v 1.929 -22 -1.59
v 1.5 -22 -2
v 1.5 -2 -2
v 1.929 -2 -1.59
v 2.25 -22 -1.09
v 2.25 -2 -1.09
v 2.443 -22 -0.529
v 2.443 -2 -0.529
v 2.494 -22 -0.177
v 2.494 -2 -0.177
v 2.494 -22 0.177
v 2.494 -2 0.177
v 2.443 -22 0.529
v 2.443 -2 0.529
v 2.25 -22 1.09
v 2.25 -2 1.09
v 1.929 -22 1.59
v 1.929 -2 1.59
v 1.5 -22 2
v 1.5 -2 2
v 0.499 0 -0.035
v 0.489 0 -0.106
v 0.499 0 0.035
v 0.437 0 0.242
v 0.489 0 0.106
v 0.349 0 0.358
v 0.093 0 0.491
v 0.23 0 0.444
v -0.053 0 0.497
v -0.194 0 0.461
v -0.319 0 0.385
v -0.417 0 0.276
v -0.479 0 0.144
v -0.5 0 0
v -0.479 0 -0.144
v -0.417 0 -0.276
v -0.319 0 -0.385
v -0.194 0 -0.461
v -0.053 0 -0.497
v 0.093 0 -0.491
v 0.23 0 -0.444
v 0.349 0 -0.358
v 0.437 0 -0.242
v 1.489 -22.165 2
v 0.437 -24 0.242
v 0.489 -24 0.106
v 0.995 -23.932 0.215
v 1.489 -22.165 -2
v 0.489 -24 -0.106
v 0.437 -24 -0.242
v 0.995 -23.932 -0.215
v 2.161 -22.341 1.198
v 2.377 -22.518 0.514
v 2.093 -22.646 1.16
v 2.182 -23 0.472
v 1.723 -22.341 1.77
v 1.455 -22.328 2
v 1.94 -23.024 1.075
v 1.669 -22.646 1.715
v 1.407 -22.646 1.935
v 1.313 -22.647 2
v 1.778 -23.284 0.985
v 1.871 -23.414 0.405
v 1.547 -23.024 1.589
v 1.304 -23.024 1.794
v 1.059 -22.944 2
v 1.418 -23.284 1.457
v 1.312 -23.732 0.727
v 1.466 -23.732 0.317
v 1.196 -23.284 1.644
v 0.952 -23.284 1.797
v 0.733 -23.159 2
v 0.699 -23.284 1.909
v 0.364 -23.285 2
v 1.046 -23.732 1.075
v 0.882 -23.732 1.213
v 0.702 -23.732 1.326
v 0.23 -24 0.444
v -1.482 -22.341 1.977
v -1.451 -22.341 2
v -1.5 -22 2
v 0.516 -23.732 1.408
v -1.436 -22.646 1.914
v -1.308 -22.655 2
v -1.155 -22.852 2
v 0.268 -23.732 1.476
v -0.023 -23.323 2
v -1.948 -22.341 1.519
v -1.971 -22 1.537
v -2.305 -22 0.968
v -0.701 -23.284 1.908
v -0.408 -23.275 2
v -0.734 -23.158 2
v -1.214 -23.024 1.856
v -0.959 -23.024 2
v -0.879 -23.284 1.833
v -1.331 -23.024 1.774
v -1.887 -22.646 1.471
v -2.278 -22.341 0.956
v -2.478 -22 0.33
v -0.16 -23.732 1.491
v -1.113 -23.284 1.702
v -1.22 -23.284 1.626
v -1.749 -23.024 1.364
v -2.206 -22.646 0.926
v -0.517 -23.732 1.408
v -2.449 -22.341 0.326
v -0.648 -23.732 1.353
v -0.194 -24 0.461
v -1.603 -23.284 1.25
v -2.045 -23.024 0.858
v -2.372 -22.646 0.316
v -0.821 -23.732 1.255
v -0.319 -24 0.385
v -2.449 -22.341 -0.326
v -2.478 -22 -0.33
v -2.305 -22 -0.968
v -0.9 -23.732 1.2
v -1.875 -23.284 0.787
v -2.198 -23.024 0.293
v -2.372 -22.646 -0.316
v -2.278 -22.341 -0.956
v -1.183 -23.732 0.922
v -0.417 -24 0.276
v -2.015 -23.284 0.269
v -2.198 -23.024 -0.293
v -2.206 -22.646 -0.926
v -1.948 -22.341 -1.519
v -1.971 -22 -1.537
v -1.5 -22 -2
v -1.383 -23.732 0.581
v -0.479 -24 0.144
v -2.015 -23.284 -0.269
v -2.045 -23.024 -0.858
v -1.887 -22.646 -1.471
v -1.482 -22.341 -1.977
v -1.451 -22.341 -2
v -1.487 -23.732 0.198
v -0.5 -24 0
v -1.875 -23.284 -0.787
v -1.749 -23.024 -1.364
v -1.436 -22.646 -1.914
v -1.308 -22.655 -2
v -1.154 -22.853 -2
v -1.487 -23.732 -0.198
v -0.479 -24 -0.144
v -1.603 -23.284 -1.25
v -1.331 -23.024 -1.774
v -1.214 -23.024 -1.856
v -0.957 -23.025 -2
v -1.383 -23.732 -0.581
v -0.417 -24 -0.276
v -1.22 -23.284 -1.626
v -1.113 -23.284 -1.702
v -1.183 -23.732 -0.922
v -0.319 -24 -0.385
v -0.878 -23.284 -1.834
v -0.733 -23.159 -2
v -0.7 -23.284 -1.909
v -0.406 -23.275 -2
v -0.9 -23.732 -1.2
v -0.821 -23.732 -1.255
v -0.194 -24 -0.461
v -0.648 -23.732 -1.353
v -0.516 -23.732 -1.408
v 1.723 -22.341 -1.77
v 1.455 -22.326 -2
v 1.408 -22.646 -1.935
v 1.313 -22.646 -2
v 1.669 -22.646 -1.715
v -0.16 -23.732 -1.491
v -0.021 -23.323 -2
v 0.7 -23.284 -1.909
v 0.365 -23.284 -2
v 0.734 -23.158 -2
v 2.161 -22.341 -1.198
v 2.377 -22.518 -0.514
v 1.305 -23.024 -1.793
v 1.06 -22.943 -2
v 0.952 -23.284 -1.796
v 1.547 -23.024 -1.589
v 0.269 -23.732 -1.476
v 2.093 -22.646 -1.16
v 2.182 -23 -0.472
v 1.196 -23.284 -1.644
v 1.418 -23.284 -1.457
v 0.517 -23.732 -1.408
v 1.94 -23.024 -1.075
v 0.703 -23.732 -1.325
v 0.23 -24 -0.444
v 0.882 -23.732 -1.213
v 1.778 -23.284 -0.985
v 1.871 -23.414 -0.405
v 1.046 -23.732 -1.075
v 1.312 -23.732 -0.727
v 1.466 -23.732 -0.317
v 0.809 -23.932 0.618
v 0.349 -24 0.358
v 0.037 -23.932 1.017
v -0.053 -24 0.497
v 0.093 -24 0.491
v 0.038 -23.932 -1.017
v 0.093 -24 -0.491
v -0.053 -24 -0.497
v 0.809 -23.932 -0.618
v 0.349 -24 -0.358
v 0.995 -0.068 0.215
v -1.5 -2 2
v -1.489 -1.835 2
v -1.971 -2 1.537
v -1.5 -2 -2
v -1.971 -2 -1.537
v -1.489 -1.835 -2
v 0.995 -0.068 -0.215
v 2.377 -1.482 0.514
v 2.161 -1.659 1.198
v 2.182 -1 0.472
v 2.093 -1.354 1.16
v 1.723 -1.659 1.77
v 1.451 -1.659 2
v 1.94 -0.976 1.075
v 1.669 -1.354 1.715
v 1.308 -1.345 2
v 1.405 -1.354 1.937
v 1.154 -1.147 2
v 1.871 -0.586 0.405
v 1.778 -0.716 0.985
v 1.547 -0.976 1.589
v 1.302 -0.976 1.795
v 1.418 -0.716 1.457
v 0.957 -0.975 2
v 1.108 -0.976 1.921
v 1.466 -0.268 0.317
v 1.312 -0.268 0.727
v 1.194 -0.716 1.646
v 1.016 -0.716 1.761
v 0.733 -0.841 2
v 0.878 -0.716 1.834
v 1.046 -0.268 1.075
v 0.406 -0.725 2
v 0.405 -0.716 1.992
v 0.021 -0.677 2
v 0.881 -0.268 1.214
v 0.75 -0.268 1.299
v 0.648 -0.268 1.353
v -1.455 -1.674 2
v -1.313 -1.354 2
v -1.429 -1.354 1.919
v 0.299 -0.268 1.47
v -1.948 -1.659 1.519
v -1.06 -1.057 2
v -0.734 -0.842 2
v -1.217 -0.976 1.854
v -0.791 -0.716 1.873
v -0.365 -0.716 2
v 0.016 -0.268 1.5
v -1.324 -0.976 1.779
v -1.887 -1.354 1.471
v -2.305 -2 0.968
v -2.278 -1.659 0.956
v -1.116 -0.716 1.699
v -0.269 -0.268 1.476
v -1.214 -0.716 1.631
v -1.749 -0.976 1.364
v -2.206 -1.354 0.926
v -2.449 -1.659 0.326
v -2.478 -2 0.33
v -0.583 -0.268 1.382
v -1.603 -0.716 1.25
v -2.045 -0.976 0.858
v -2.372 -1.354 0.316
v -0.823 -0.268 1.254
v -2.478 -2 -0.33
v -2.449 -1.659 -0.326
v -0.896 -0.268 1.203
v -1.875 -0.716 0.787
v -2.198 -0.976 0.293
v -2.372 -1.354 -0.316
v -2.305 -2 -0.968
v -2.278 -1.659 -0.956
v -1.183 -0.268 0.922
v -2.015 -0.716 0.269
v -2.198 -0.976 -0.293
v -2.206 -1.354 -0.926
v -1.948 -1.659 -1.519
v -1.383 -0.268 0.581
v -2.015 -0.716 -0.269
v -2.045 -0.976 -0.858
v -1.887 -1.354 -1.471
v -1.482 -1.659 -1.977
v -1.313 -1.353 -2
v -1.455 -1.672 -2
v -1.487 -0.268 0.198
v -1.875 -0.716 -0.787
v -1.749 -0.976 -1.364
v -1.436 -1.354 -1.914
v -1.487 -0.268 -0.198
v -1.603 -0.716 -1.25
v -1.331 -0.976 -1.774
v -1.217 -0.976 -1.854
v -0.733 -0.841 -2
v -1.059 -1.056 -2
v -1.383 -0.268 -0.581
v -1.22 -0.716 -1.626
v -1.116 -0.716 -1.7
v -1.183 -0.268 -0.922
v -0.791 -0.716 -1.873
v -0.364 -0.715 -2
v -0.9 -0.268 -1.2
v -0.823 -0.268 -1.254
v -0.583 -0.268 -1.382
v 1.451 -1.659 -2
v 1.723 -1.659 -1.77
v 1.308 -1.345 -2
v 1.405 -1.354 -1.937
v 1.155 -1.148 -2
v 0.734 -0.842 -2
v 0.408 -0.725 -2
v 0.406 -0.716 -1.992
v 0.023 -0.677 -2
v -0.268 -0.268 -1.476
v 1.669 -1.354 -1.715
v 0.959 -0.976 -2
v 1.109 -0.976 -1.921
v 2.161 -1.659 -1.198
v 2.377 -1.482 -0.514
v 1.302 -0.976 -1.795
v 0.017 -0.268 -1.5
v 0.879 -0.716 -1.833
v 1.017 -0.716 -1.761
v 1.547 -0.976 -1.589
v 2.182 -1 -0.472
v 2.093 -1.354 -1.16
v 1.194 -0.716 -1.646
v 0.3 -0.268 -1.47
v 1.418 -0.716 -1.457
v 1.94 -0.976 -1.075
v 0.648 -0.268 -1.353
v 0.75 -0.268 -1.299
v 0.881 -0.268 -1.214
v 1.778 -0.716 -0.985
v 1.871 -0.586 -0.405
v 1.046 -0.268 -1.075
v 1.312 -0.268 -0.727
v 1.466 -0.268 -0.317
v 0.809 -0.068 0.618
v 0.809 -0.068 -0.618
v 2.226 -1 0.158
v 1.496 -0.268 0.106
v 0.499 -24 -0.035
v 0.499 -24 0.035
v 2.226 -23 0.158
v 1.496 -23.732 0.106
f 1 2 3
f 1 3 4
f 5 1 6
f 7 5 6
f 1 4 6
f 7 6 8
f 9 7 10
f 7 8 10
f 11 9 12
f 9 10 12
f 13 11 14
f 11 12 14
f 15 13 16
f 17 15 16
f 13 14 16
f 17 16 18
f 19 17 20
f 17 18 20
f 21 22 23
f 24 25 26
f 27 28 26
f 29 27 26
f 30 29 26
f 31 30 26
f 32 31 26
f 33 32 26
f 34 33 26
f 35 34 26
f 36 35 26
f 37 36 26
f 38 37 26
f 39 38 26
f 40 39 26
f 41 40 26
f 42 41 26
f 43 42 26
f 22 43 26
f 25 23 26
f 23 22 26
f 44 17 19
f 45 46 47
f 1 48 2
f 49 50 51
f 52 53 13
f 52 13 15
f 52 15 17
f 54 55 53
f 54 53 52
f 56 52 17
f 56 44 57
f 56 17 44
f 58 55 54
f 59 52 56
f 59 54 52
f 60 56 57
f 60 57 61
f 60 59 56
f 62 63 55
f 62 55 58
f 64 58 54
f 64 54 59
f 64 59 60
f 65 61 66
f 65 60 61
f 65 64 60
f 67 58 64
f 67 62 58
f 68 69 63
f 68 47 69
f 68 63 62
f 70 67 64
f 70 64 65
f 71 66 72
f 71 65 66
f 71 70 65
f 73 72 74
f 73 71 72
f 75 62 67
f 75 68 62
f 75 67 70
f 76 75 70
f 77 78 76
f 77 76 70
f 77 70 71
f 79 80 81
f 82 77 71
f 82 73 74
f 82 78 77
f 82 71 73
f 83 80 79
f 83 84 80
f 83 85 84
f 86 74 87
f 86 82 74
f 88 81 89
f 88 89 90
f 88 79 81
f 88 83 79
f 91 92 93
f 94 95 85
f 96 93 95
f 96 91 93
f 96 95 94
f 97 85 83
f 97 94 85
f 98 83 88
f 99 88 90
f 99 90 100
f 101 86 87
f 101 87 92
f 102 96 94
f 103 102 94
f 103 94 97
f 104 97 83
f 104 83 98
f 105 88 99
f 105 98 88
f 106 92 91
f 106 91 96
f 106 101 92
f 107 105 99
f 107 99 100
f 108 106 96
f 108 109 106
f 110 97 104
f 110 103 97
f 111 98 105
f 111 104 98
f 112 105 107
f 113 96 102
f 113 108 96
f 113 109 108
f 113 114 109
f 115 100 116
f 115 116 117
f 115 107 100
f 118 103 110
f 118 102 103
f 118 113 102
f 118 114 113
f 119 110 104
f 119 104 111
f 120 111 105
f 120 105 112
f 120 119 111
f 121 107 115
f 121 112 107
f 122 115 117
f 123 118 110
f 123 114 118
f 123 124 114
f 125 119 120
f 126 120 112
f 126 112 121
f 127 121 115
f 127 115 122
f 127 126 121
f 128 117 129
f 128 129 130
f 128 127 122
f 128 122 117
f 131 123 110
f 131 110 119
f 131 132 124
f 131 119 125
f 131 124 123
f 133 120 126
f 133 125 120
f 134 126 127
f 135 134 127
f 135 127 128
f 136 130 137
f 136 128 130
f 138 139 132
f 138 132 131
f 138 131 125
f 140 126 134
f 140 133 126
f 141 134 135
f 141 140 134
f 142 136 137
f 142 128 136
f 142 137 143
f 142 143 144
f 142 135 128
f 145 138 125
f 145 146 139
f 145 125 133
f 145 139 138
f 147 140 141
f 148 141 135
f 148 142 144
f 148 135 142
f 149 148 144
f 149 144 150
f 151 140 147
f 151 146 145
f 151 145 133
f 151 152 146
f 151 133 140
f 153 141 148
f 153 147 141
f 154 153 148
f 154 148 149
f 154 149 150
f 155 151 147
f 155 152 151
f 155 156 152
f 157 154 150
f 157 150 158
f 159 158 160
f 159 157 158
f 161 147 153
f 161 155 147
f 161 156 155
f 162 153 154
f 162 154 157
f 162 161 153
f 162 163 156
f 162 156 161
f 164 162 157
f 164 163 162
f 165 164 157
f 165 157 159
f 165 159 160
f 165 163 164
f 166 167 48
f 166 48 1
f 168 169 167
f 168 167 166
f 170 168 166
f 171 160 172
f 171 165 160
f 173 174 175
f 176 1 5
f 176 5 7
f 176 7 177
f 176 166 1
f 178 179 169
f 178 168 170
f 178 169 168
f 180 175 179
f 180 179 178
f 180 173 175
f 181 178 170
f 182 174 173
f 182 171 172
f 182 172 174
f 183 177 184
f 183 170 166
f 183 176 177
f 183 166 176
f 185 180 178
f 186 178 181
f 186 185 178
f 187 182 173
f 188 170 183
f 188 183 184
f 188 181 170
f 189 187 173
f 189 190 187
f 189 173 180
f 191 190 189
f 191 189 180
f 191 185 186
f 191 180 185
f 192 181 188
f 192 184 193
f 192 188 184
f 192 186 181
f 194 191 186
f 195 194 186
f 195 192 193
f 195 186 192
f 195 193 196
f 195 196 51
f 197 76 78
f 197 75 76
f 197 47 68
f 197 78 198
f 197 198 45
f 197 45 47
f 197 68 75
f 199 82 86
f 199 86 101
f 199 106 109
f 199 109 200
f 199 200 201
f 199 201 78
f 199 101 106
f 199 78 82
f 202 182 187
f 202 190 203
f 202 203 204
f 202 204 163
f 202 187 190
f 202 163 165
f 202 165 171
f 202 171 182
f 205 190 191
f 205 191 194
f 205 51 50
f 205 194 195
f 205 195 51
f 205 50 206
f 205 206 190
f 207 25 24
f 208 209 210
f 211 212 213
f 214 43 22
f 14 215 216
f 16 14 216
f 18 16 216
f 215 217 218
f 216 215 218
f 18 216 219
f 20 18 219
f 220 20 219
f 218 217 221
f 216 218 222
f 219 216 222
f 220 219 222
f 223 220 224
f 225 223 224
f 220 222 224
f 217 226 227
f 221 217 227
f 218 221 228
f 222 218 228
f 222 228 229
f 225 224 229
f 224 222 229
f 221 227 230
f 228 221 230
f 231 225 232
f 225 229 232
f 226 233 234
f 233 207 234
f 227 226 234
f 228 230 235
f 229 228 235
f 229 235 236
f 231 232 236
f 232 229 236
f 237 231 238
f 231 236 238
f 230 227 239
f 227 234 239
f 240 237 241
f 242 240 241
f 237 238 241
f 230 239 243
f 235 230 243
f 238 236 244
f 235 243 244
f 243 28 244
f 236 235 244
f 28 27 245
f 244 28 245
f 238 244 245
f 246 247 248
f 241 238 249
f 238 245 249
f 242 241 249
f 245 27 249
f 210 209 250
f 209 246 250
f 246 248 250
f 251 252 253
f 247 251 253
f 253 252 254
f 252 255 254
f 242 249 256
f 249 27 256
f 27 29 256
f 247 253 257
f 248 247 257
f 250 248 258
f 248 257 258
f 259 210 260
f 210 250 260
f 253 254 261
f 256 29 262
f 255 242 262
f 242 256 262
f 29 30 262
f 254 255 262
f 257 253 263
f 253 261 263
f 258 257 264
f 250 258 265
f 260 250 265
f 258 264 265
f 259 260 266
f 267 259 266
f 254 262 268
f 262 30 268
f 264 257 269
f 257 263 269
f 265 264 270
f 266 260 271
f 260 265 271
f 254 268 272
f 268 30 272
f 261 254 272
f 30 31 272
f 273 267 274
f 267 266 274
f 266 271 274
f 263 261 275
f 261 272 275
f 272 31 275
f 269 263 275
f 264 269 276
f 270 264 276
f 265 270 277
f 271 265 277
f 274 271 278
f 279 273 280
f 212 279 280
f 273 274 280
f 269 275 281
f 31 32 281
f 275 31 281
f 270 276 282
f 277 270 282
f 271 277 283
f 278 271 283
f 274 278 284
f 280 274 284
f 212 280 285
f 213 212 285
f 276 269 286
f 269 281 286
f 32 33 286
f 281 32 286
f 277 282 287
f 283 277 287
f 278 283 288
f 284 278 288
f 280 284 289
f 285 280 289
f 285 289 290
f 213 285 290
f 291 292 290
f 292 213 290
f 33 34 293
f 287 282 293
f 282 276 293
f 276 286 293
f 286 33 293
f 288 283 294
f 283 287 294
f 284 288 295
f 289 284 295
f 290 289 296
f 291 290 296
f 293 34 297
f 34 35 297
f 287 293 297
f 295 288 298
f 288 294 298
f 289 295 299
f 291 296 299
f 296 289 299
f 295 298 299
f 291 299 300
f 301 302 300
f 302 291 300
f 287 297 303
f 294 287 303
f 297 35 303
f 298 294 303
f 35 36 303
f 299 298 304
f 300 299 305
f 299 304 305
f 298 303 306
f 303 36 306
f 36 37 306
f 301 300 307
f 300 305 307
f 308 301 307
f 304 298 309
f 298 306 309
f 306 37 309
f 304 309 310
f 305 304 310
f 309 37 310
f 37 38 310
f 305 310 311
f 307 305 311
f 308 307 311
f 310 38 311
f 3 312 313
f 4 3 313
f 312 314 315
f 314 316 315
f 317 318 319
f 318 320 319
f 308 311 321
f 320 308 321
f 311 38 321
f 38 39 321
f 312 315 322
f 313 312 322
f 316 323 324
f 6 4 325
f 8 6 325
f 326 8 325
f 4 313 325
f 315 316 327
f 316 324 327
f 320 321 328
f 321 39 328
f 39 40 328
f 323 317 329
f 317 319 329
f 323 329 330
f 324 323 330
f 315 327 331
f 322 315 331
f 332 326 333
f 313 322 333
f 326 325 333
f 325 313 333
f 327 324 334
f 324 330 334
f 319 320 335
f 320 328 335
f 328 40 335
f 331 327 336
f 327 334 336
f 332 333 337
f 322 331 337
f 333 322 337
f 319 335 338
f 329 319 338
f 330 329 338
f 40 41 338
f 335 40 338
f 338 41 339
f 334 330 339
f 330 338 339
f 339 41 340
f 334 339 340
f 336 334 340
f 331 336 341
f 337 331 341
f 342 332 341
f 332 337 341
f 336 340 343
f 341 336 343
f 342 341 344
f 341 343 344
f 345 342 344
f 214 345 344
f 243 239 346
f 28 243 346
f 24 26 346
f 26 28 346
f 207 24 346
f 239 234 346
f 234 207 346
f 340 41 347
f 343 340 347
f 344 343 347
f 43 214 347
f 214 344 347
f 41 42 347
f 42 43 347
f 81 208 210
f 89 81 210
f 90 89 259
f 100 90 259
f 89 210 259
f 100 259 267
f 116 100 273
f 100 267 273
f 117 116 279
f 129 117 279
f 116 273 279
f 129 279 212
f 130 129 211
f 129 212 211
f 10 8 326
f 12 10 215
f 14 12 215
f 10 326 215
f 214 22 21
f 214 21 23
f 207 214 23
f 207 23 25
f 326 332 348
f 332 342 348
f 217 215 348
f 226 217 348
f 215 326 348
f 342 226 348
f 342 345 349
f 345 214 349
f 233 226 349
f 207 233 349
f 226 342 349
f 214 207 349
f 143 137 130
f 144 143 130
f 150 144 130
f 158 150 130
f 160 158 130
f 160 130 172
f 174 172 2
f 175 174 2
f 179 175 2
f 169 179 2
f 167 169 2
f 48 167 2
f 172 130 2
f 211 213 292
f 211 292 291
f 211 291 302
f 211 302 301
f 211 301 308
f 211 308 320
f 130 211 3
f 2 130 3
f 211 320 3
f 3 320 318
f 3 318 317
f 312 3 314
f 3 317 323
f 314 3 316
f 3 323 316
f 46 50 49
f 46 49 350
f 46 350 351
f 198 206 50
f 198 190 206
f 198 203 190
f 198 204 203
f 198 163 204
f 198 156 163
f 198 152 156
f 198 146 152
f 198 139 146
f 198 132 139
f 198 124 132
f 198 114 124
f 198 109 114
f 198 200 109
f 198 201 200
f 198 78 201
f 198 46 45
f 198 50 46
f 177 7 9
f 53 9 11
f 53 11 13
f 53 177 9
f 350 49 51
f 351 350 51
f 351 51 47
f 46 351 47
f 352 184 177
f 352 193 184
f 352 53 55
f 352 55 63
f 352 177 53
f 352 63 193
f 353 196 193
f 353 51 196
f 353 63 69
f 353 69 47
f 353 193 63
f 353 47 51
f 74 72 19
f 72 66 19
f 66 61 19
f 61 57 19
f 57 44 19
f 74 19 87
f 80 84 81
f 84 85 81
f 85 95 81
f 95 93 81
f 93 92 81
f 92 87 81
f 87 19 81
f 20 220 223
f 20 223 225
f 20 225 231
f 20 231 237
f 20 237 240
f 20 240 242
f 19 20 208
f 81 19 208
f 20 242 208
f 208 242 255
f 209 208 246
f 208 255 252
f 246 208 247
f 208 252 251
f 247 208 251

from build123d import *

# Parameters (mm, degrees)
F1_DEPTH    = 24
F2_T2_ANGLE = 335.5716732895
F2_T4_ANGLE = 335.5716732895
F2_T6_ANGLE = 253.6182255886
F2_T8_ANGLE = 253.6182255886


# Not quite as in the source:
# - a fillet or chamfer that OpenCascade refuses, or shapes differently, is made with other operations: its cross-section is extruded or revolved along the edge and cut away or added


with BuildPart() as f1:
    # F0 (on Front) → F1 (new body)
    with BuildSketch(Plane.XZ):
        with BuildLine():
            Line((1.5, 2), (-1.5, 2))
            ThreePointArc((-1.5, 2), (-2.5, 0), (-1.5, -2))
            Line((-1.5, -2), (1.5, -2))
            ThreePointArc((1.5, -2), (2.5, 0), (1.5, 2))
        make_face()
    extrude(amount=F1_DEPTH)

    # F2: fillet of radius 2 on 4 edges, made by hand

    # F2_s1 → F2_t2 (revolve, cut)
    with BuildSketch(Plane(origin=(0, 0, 0), x_dir=(0, 1, 0), z_dir=(0.2115664045, 0, -0.9773636255))):
        with BuildLine():
            ThreePointArc((-2, 2.5), (-0.5857864376, 1.9142135624), (0, 0.5))
            Line((0, 0.5), (0, 2.5))
            Line((0, 2.5), (-2, 2.5))
        make_face()
    revolve(axis=Axis((0, 0, 0), (0, -1, 0)), revolution_arc=F2_T2_ANGLE, mode=Mode.SUBTRACT)

    # F2_s3 → F2_t4 (revolve, cut)
    with BuildSketch(Plane(origin=(0, 0, 0), x_dir=(0, 1, 0), z_dir=(0.2115664045, 0, -0.9773636255))):
        with BuildLine():
            ThreePointArc((-22, 2.5), (-23.4142135624, 1.9142135624), (-24, 0.5))
            Line((-24, 0.5), (-24, 2.5))
            Line((-24, 2.5), (-22, 2.5))
        make_face()
    revolve(axis=Axis((0, -24, 0), (0, -1, 0)), revolution_arc=F2_T4_ANGLE, mode=Mode.SUBTRACT)

    # F2_s5 → F2_t6 (revolve, cut)
    with BuildSketch(Plane(origin=(0, 0, 0), x_dir=(0, 1, 0), z_dir=(-0.8006360872, 0, 0.5991509459))):
        with BuildLine():
            ThreePointArc((-2, 2.5), (-0.5857864376, 1.9142135624), (0, 0.5))
            Line((0, 0.5), (0, 2.5))
            Line((0, 2.5), (-2, 2.5))
        make_face()
    revolve(axis=Axis((0, 0, 0), (0, -1, 0)), revolution_arc=F2_T6_ANGLE, mode=Mode.SUBTRACT)

    # F2_s7 → F2_t8 (revolve, cut)
    with BuildSketch(Plane(origin=(0, 0, 0), x_dir=(0, 1, 0), z_dir=(-0.8006360872, 0, 0.5991509459))):
        with BuildLine():
            ThreePointArc((-22, 2.5), (-23.4142135624, 1.9142135624), (-24, 0.5))
            Line((-24, 0.5), (-24, 2.5))
            Line((-24, 2.5), (-22, 2.5))
        make_face()
    revolve(axis=Axis((0, -24, 0), (0, -1, 0)), revolution_arc=F2_T8_ANGLE, mode=Mode.SUBTRACT)


solid = f1.part
